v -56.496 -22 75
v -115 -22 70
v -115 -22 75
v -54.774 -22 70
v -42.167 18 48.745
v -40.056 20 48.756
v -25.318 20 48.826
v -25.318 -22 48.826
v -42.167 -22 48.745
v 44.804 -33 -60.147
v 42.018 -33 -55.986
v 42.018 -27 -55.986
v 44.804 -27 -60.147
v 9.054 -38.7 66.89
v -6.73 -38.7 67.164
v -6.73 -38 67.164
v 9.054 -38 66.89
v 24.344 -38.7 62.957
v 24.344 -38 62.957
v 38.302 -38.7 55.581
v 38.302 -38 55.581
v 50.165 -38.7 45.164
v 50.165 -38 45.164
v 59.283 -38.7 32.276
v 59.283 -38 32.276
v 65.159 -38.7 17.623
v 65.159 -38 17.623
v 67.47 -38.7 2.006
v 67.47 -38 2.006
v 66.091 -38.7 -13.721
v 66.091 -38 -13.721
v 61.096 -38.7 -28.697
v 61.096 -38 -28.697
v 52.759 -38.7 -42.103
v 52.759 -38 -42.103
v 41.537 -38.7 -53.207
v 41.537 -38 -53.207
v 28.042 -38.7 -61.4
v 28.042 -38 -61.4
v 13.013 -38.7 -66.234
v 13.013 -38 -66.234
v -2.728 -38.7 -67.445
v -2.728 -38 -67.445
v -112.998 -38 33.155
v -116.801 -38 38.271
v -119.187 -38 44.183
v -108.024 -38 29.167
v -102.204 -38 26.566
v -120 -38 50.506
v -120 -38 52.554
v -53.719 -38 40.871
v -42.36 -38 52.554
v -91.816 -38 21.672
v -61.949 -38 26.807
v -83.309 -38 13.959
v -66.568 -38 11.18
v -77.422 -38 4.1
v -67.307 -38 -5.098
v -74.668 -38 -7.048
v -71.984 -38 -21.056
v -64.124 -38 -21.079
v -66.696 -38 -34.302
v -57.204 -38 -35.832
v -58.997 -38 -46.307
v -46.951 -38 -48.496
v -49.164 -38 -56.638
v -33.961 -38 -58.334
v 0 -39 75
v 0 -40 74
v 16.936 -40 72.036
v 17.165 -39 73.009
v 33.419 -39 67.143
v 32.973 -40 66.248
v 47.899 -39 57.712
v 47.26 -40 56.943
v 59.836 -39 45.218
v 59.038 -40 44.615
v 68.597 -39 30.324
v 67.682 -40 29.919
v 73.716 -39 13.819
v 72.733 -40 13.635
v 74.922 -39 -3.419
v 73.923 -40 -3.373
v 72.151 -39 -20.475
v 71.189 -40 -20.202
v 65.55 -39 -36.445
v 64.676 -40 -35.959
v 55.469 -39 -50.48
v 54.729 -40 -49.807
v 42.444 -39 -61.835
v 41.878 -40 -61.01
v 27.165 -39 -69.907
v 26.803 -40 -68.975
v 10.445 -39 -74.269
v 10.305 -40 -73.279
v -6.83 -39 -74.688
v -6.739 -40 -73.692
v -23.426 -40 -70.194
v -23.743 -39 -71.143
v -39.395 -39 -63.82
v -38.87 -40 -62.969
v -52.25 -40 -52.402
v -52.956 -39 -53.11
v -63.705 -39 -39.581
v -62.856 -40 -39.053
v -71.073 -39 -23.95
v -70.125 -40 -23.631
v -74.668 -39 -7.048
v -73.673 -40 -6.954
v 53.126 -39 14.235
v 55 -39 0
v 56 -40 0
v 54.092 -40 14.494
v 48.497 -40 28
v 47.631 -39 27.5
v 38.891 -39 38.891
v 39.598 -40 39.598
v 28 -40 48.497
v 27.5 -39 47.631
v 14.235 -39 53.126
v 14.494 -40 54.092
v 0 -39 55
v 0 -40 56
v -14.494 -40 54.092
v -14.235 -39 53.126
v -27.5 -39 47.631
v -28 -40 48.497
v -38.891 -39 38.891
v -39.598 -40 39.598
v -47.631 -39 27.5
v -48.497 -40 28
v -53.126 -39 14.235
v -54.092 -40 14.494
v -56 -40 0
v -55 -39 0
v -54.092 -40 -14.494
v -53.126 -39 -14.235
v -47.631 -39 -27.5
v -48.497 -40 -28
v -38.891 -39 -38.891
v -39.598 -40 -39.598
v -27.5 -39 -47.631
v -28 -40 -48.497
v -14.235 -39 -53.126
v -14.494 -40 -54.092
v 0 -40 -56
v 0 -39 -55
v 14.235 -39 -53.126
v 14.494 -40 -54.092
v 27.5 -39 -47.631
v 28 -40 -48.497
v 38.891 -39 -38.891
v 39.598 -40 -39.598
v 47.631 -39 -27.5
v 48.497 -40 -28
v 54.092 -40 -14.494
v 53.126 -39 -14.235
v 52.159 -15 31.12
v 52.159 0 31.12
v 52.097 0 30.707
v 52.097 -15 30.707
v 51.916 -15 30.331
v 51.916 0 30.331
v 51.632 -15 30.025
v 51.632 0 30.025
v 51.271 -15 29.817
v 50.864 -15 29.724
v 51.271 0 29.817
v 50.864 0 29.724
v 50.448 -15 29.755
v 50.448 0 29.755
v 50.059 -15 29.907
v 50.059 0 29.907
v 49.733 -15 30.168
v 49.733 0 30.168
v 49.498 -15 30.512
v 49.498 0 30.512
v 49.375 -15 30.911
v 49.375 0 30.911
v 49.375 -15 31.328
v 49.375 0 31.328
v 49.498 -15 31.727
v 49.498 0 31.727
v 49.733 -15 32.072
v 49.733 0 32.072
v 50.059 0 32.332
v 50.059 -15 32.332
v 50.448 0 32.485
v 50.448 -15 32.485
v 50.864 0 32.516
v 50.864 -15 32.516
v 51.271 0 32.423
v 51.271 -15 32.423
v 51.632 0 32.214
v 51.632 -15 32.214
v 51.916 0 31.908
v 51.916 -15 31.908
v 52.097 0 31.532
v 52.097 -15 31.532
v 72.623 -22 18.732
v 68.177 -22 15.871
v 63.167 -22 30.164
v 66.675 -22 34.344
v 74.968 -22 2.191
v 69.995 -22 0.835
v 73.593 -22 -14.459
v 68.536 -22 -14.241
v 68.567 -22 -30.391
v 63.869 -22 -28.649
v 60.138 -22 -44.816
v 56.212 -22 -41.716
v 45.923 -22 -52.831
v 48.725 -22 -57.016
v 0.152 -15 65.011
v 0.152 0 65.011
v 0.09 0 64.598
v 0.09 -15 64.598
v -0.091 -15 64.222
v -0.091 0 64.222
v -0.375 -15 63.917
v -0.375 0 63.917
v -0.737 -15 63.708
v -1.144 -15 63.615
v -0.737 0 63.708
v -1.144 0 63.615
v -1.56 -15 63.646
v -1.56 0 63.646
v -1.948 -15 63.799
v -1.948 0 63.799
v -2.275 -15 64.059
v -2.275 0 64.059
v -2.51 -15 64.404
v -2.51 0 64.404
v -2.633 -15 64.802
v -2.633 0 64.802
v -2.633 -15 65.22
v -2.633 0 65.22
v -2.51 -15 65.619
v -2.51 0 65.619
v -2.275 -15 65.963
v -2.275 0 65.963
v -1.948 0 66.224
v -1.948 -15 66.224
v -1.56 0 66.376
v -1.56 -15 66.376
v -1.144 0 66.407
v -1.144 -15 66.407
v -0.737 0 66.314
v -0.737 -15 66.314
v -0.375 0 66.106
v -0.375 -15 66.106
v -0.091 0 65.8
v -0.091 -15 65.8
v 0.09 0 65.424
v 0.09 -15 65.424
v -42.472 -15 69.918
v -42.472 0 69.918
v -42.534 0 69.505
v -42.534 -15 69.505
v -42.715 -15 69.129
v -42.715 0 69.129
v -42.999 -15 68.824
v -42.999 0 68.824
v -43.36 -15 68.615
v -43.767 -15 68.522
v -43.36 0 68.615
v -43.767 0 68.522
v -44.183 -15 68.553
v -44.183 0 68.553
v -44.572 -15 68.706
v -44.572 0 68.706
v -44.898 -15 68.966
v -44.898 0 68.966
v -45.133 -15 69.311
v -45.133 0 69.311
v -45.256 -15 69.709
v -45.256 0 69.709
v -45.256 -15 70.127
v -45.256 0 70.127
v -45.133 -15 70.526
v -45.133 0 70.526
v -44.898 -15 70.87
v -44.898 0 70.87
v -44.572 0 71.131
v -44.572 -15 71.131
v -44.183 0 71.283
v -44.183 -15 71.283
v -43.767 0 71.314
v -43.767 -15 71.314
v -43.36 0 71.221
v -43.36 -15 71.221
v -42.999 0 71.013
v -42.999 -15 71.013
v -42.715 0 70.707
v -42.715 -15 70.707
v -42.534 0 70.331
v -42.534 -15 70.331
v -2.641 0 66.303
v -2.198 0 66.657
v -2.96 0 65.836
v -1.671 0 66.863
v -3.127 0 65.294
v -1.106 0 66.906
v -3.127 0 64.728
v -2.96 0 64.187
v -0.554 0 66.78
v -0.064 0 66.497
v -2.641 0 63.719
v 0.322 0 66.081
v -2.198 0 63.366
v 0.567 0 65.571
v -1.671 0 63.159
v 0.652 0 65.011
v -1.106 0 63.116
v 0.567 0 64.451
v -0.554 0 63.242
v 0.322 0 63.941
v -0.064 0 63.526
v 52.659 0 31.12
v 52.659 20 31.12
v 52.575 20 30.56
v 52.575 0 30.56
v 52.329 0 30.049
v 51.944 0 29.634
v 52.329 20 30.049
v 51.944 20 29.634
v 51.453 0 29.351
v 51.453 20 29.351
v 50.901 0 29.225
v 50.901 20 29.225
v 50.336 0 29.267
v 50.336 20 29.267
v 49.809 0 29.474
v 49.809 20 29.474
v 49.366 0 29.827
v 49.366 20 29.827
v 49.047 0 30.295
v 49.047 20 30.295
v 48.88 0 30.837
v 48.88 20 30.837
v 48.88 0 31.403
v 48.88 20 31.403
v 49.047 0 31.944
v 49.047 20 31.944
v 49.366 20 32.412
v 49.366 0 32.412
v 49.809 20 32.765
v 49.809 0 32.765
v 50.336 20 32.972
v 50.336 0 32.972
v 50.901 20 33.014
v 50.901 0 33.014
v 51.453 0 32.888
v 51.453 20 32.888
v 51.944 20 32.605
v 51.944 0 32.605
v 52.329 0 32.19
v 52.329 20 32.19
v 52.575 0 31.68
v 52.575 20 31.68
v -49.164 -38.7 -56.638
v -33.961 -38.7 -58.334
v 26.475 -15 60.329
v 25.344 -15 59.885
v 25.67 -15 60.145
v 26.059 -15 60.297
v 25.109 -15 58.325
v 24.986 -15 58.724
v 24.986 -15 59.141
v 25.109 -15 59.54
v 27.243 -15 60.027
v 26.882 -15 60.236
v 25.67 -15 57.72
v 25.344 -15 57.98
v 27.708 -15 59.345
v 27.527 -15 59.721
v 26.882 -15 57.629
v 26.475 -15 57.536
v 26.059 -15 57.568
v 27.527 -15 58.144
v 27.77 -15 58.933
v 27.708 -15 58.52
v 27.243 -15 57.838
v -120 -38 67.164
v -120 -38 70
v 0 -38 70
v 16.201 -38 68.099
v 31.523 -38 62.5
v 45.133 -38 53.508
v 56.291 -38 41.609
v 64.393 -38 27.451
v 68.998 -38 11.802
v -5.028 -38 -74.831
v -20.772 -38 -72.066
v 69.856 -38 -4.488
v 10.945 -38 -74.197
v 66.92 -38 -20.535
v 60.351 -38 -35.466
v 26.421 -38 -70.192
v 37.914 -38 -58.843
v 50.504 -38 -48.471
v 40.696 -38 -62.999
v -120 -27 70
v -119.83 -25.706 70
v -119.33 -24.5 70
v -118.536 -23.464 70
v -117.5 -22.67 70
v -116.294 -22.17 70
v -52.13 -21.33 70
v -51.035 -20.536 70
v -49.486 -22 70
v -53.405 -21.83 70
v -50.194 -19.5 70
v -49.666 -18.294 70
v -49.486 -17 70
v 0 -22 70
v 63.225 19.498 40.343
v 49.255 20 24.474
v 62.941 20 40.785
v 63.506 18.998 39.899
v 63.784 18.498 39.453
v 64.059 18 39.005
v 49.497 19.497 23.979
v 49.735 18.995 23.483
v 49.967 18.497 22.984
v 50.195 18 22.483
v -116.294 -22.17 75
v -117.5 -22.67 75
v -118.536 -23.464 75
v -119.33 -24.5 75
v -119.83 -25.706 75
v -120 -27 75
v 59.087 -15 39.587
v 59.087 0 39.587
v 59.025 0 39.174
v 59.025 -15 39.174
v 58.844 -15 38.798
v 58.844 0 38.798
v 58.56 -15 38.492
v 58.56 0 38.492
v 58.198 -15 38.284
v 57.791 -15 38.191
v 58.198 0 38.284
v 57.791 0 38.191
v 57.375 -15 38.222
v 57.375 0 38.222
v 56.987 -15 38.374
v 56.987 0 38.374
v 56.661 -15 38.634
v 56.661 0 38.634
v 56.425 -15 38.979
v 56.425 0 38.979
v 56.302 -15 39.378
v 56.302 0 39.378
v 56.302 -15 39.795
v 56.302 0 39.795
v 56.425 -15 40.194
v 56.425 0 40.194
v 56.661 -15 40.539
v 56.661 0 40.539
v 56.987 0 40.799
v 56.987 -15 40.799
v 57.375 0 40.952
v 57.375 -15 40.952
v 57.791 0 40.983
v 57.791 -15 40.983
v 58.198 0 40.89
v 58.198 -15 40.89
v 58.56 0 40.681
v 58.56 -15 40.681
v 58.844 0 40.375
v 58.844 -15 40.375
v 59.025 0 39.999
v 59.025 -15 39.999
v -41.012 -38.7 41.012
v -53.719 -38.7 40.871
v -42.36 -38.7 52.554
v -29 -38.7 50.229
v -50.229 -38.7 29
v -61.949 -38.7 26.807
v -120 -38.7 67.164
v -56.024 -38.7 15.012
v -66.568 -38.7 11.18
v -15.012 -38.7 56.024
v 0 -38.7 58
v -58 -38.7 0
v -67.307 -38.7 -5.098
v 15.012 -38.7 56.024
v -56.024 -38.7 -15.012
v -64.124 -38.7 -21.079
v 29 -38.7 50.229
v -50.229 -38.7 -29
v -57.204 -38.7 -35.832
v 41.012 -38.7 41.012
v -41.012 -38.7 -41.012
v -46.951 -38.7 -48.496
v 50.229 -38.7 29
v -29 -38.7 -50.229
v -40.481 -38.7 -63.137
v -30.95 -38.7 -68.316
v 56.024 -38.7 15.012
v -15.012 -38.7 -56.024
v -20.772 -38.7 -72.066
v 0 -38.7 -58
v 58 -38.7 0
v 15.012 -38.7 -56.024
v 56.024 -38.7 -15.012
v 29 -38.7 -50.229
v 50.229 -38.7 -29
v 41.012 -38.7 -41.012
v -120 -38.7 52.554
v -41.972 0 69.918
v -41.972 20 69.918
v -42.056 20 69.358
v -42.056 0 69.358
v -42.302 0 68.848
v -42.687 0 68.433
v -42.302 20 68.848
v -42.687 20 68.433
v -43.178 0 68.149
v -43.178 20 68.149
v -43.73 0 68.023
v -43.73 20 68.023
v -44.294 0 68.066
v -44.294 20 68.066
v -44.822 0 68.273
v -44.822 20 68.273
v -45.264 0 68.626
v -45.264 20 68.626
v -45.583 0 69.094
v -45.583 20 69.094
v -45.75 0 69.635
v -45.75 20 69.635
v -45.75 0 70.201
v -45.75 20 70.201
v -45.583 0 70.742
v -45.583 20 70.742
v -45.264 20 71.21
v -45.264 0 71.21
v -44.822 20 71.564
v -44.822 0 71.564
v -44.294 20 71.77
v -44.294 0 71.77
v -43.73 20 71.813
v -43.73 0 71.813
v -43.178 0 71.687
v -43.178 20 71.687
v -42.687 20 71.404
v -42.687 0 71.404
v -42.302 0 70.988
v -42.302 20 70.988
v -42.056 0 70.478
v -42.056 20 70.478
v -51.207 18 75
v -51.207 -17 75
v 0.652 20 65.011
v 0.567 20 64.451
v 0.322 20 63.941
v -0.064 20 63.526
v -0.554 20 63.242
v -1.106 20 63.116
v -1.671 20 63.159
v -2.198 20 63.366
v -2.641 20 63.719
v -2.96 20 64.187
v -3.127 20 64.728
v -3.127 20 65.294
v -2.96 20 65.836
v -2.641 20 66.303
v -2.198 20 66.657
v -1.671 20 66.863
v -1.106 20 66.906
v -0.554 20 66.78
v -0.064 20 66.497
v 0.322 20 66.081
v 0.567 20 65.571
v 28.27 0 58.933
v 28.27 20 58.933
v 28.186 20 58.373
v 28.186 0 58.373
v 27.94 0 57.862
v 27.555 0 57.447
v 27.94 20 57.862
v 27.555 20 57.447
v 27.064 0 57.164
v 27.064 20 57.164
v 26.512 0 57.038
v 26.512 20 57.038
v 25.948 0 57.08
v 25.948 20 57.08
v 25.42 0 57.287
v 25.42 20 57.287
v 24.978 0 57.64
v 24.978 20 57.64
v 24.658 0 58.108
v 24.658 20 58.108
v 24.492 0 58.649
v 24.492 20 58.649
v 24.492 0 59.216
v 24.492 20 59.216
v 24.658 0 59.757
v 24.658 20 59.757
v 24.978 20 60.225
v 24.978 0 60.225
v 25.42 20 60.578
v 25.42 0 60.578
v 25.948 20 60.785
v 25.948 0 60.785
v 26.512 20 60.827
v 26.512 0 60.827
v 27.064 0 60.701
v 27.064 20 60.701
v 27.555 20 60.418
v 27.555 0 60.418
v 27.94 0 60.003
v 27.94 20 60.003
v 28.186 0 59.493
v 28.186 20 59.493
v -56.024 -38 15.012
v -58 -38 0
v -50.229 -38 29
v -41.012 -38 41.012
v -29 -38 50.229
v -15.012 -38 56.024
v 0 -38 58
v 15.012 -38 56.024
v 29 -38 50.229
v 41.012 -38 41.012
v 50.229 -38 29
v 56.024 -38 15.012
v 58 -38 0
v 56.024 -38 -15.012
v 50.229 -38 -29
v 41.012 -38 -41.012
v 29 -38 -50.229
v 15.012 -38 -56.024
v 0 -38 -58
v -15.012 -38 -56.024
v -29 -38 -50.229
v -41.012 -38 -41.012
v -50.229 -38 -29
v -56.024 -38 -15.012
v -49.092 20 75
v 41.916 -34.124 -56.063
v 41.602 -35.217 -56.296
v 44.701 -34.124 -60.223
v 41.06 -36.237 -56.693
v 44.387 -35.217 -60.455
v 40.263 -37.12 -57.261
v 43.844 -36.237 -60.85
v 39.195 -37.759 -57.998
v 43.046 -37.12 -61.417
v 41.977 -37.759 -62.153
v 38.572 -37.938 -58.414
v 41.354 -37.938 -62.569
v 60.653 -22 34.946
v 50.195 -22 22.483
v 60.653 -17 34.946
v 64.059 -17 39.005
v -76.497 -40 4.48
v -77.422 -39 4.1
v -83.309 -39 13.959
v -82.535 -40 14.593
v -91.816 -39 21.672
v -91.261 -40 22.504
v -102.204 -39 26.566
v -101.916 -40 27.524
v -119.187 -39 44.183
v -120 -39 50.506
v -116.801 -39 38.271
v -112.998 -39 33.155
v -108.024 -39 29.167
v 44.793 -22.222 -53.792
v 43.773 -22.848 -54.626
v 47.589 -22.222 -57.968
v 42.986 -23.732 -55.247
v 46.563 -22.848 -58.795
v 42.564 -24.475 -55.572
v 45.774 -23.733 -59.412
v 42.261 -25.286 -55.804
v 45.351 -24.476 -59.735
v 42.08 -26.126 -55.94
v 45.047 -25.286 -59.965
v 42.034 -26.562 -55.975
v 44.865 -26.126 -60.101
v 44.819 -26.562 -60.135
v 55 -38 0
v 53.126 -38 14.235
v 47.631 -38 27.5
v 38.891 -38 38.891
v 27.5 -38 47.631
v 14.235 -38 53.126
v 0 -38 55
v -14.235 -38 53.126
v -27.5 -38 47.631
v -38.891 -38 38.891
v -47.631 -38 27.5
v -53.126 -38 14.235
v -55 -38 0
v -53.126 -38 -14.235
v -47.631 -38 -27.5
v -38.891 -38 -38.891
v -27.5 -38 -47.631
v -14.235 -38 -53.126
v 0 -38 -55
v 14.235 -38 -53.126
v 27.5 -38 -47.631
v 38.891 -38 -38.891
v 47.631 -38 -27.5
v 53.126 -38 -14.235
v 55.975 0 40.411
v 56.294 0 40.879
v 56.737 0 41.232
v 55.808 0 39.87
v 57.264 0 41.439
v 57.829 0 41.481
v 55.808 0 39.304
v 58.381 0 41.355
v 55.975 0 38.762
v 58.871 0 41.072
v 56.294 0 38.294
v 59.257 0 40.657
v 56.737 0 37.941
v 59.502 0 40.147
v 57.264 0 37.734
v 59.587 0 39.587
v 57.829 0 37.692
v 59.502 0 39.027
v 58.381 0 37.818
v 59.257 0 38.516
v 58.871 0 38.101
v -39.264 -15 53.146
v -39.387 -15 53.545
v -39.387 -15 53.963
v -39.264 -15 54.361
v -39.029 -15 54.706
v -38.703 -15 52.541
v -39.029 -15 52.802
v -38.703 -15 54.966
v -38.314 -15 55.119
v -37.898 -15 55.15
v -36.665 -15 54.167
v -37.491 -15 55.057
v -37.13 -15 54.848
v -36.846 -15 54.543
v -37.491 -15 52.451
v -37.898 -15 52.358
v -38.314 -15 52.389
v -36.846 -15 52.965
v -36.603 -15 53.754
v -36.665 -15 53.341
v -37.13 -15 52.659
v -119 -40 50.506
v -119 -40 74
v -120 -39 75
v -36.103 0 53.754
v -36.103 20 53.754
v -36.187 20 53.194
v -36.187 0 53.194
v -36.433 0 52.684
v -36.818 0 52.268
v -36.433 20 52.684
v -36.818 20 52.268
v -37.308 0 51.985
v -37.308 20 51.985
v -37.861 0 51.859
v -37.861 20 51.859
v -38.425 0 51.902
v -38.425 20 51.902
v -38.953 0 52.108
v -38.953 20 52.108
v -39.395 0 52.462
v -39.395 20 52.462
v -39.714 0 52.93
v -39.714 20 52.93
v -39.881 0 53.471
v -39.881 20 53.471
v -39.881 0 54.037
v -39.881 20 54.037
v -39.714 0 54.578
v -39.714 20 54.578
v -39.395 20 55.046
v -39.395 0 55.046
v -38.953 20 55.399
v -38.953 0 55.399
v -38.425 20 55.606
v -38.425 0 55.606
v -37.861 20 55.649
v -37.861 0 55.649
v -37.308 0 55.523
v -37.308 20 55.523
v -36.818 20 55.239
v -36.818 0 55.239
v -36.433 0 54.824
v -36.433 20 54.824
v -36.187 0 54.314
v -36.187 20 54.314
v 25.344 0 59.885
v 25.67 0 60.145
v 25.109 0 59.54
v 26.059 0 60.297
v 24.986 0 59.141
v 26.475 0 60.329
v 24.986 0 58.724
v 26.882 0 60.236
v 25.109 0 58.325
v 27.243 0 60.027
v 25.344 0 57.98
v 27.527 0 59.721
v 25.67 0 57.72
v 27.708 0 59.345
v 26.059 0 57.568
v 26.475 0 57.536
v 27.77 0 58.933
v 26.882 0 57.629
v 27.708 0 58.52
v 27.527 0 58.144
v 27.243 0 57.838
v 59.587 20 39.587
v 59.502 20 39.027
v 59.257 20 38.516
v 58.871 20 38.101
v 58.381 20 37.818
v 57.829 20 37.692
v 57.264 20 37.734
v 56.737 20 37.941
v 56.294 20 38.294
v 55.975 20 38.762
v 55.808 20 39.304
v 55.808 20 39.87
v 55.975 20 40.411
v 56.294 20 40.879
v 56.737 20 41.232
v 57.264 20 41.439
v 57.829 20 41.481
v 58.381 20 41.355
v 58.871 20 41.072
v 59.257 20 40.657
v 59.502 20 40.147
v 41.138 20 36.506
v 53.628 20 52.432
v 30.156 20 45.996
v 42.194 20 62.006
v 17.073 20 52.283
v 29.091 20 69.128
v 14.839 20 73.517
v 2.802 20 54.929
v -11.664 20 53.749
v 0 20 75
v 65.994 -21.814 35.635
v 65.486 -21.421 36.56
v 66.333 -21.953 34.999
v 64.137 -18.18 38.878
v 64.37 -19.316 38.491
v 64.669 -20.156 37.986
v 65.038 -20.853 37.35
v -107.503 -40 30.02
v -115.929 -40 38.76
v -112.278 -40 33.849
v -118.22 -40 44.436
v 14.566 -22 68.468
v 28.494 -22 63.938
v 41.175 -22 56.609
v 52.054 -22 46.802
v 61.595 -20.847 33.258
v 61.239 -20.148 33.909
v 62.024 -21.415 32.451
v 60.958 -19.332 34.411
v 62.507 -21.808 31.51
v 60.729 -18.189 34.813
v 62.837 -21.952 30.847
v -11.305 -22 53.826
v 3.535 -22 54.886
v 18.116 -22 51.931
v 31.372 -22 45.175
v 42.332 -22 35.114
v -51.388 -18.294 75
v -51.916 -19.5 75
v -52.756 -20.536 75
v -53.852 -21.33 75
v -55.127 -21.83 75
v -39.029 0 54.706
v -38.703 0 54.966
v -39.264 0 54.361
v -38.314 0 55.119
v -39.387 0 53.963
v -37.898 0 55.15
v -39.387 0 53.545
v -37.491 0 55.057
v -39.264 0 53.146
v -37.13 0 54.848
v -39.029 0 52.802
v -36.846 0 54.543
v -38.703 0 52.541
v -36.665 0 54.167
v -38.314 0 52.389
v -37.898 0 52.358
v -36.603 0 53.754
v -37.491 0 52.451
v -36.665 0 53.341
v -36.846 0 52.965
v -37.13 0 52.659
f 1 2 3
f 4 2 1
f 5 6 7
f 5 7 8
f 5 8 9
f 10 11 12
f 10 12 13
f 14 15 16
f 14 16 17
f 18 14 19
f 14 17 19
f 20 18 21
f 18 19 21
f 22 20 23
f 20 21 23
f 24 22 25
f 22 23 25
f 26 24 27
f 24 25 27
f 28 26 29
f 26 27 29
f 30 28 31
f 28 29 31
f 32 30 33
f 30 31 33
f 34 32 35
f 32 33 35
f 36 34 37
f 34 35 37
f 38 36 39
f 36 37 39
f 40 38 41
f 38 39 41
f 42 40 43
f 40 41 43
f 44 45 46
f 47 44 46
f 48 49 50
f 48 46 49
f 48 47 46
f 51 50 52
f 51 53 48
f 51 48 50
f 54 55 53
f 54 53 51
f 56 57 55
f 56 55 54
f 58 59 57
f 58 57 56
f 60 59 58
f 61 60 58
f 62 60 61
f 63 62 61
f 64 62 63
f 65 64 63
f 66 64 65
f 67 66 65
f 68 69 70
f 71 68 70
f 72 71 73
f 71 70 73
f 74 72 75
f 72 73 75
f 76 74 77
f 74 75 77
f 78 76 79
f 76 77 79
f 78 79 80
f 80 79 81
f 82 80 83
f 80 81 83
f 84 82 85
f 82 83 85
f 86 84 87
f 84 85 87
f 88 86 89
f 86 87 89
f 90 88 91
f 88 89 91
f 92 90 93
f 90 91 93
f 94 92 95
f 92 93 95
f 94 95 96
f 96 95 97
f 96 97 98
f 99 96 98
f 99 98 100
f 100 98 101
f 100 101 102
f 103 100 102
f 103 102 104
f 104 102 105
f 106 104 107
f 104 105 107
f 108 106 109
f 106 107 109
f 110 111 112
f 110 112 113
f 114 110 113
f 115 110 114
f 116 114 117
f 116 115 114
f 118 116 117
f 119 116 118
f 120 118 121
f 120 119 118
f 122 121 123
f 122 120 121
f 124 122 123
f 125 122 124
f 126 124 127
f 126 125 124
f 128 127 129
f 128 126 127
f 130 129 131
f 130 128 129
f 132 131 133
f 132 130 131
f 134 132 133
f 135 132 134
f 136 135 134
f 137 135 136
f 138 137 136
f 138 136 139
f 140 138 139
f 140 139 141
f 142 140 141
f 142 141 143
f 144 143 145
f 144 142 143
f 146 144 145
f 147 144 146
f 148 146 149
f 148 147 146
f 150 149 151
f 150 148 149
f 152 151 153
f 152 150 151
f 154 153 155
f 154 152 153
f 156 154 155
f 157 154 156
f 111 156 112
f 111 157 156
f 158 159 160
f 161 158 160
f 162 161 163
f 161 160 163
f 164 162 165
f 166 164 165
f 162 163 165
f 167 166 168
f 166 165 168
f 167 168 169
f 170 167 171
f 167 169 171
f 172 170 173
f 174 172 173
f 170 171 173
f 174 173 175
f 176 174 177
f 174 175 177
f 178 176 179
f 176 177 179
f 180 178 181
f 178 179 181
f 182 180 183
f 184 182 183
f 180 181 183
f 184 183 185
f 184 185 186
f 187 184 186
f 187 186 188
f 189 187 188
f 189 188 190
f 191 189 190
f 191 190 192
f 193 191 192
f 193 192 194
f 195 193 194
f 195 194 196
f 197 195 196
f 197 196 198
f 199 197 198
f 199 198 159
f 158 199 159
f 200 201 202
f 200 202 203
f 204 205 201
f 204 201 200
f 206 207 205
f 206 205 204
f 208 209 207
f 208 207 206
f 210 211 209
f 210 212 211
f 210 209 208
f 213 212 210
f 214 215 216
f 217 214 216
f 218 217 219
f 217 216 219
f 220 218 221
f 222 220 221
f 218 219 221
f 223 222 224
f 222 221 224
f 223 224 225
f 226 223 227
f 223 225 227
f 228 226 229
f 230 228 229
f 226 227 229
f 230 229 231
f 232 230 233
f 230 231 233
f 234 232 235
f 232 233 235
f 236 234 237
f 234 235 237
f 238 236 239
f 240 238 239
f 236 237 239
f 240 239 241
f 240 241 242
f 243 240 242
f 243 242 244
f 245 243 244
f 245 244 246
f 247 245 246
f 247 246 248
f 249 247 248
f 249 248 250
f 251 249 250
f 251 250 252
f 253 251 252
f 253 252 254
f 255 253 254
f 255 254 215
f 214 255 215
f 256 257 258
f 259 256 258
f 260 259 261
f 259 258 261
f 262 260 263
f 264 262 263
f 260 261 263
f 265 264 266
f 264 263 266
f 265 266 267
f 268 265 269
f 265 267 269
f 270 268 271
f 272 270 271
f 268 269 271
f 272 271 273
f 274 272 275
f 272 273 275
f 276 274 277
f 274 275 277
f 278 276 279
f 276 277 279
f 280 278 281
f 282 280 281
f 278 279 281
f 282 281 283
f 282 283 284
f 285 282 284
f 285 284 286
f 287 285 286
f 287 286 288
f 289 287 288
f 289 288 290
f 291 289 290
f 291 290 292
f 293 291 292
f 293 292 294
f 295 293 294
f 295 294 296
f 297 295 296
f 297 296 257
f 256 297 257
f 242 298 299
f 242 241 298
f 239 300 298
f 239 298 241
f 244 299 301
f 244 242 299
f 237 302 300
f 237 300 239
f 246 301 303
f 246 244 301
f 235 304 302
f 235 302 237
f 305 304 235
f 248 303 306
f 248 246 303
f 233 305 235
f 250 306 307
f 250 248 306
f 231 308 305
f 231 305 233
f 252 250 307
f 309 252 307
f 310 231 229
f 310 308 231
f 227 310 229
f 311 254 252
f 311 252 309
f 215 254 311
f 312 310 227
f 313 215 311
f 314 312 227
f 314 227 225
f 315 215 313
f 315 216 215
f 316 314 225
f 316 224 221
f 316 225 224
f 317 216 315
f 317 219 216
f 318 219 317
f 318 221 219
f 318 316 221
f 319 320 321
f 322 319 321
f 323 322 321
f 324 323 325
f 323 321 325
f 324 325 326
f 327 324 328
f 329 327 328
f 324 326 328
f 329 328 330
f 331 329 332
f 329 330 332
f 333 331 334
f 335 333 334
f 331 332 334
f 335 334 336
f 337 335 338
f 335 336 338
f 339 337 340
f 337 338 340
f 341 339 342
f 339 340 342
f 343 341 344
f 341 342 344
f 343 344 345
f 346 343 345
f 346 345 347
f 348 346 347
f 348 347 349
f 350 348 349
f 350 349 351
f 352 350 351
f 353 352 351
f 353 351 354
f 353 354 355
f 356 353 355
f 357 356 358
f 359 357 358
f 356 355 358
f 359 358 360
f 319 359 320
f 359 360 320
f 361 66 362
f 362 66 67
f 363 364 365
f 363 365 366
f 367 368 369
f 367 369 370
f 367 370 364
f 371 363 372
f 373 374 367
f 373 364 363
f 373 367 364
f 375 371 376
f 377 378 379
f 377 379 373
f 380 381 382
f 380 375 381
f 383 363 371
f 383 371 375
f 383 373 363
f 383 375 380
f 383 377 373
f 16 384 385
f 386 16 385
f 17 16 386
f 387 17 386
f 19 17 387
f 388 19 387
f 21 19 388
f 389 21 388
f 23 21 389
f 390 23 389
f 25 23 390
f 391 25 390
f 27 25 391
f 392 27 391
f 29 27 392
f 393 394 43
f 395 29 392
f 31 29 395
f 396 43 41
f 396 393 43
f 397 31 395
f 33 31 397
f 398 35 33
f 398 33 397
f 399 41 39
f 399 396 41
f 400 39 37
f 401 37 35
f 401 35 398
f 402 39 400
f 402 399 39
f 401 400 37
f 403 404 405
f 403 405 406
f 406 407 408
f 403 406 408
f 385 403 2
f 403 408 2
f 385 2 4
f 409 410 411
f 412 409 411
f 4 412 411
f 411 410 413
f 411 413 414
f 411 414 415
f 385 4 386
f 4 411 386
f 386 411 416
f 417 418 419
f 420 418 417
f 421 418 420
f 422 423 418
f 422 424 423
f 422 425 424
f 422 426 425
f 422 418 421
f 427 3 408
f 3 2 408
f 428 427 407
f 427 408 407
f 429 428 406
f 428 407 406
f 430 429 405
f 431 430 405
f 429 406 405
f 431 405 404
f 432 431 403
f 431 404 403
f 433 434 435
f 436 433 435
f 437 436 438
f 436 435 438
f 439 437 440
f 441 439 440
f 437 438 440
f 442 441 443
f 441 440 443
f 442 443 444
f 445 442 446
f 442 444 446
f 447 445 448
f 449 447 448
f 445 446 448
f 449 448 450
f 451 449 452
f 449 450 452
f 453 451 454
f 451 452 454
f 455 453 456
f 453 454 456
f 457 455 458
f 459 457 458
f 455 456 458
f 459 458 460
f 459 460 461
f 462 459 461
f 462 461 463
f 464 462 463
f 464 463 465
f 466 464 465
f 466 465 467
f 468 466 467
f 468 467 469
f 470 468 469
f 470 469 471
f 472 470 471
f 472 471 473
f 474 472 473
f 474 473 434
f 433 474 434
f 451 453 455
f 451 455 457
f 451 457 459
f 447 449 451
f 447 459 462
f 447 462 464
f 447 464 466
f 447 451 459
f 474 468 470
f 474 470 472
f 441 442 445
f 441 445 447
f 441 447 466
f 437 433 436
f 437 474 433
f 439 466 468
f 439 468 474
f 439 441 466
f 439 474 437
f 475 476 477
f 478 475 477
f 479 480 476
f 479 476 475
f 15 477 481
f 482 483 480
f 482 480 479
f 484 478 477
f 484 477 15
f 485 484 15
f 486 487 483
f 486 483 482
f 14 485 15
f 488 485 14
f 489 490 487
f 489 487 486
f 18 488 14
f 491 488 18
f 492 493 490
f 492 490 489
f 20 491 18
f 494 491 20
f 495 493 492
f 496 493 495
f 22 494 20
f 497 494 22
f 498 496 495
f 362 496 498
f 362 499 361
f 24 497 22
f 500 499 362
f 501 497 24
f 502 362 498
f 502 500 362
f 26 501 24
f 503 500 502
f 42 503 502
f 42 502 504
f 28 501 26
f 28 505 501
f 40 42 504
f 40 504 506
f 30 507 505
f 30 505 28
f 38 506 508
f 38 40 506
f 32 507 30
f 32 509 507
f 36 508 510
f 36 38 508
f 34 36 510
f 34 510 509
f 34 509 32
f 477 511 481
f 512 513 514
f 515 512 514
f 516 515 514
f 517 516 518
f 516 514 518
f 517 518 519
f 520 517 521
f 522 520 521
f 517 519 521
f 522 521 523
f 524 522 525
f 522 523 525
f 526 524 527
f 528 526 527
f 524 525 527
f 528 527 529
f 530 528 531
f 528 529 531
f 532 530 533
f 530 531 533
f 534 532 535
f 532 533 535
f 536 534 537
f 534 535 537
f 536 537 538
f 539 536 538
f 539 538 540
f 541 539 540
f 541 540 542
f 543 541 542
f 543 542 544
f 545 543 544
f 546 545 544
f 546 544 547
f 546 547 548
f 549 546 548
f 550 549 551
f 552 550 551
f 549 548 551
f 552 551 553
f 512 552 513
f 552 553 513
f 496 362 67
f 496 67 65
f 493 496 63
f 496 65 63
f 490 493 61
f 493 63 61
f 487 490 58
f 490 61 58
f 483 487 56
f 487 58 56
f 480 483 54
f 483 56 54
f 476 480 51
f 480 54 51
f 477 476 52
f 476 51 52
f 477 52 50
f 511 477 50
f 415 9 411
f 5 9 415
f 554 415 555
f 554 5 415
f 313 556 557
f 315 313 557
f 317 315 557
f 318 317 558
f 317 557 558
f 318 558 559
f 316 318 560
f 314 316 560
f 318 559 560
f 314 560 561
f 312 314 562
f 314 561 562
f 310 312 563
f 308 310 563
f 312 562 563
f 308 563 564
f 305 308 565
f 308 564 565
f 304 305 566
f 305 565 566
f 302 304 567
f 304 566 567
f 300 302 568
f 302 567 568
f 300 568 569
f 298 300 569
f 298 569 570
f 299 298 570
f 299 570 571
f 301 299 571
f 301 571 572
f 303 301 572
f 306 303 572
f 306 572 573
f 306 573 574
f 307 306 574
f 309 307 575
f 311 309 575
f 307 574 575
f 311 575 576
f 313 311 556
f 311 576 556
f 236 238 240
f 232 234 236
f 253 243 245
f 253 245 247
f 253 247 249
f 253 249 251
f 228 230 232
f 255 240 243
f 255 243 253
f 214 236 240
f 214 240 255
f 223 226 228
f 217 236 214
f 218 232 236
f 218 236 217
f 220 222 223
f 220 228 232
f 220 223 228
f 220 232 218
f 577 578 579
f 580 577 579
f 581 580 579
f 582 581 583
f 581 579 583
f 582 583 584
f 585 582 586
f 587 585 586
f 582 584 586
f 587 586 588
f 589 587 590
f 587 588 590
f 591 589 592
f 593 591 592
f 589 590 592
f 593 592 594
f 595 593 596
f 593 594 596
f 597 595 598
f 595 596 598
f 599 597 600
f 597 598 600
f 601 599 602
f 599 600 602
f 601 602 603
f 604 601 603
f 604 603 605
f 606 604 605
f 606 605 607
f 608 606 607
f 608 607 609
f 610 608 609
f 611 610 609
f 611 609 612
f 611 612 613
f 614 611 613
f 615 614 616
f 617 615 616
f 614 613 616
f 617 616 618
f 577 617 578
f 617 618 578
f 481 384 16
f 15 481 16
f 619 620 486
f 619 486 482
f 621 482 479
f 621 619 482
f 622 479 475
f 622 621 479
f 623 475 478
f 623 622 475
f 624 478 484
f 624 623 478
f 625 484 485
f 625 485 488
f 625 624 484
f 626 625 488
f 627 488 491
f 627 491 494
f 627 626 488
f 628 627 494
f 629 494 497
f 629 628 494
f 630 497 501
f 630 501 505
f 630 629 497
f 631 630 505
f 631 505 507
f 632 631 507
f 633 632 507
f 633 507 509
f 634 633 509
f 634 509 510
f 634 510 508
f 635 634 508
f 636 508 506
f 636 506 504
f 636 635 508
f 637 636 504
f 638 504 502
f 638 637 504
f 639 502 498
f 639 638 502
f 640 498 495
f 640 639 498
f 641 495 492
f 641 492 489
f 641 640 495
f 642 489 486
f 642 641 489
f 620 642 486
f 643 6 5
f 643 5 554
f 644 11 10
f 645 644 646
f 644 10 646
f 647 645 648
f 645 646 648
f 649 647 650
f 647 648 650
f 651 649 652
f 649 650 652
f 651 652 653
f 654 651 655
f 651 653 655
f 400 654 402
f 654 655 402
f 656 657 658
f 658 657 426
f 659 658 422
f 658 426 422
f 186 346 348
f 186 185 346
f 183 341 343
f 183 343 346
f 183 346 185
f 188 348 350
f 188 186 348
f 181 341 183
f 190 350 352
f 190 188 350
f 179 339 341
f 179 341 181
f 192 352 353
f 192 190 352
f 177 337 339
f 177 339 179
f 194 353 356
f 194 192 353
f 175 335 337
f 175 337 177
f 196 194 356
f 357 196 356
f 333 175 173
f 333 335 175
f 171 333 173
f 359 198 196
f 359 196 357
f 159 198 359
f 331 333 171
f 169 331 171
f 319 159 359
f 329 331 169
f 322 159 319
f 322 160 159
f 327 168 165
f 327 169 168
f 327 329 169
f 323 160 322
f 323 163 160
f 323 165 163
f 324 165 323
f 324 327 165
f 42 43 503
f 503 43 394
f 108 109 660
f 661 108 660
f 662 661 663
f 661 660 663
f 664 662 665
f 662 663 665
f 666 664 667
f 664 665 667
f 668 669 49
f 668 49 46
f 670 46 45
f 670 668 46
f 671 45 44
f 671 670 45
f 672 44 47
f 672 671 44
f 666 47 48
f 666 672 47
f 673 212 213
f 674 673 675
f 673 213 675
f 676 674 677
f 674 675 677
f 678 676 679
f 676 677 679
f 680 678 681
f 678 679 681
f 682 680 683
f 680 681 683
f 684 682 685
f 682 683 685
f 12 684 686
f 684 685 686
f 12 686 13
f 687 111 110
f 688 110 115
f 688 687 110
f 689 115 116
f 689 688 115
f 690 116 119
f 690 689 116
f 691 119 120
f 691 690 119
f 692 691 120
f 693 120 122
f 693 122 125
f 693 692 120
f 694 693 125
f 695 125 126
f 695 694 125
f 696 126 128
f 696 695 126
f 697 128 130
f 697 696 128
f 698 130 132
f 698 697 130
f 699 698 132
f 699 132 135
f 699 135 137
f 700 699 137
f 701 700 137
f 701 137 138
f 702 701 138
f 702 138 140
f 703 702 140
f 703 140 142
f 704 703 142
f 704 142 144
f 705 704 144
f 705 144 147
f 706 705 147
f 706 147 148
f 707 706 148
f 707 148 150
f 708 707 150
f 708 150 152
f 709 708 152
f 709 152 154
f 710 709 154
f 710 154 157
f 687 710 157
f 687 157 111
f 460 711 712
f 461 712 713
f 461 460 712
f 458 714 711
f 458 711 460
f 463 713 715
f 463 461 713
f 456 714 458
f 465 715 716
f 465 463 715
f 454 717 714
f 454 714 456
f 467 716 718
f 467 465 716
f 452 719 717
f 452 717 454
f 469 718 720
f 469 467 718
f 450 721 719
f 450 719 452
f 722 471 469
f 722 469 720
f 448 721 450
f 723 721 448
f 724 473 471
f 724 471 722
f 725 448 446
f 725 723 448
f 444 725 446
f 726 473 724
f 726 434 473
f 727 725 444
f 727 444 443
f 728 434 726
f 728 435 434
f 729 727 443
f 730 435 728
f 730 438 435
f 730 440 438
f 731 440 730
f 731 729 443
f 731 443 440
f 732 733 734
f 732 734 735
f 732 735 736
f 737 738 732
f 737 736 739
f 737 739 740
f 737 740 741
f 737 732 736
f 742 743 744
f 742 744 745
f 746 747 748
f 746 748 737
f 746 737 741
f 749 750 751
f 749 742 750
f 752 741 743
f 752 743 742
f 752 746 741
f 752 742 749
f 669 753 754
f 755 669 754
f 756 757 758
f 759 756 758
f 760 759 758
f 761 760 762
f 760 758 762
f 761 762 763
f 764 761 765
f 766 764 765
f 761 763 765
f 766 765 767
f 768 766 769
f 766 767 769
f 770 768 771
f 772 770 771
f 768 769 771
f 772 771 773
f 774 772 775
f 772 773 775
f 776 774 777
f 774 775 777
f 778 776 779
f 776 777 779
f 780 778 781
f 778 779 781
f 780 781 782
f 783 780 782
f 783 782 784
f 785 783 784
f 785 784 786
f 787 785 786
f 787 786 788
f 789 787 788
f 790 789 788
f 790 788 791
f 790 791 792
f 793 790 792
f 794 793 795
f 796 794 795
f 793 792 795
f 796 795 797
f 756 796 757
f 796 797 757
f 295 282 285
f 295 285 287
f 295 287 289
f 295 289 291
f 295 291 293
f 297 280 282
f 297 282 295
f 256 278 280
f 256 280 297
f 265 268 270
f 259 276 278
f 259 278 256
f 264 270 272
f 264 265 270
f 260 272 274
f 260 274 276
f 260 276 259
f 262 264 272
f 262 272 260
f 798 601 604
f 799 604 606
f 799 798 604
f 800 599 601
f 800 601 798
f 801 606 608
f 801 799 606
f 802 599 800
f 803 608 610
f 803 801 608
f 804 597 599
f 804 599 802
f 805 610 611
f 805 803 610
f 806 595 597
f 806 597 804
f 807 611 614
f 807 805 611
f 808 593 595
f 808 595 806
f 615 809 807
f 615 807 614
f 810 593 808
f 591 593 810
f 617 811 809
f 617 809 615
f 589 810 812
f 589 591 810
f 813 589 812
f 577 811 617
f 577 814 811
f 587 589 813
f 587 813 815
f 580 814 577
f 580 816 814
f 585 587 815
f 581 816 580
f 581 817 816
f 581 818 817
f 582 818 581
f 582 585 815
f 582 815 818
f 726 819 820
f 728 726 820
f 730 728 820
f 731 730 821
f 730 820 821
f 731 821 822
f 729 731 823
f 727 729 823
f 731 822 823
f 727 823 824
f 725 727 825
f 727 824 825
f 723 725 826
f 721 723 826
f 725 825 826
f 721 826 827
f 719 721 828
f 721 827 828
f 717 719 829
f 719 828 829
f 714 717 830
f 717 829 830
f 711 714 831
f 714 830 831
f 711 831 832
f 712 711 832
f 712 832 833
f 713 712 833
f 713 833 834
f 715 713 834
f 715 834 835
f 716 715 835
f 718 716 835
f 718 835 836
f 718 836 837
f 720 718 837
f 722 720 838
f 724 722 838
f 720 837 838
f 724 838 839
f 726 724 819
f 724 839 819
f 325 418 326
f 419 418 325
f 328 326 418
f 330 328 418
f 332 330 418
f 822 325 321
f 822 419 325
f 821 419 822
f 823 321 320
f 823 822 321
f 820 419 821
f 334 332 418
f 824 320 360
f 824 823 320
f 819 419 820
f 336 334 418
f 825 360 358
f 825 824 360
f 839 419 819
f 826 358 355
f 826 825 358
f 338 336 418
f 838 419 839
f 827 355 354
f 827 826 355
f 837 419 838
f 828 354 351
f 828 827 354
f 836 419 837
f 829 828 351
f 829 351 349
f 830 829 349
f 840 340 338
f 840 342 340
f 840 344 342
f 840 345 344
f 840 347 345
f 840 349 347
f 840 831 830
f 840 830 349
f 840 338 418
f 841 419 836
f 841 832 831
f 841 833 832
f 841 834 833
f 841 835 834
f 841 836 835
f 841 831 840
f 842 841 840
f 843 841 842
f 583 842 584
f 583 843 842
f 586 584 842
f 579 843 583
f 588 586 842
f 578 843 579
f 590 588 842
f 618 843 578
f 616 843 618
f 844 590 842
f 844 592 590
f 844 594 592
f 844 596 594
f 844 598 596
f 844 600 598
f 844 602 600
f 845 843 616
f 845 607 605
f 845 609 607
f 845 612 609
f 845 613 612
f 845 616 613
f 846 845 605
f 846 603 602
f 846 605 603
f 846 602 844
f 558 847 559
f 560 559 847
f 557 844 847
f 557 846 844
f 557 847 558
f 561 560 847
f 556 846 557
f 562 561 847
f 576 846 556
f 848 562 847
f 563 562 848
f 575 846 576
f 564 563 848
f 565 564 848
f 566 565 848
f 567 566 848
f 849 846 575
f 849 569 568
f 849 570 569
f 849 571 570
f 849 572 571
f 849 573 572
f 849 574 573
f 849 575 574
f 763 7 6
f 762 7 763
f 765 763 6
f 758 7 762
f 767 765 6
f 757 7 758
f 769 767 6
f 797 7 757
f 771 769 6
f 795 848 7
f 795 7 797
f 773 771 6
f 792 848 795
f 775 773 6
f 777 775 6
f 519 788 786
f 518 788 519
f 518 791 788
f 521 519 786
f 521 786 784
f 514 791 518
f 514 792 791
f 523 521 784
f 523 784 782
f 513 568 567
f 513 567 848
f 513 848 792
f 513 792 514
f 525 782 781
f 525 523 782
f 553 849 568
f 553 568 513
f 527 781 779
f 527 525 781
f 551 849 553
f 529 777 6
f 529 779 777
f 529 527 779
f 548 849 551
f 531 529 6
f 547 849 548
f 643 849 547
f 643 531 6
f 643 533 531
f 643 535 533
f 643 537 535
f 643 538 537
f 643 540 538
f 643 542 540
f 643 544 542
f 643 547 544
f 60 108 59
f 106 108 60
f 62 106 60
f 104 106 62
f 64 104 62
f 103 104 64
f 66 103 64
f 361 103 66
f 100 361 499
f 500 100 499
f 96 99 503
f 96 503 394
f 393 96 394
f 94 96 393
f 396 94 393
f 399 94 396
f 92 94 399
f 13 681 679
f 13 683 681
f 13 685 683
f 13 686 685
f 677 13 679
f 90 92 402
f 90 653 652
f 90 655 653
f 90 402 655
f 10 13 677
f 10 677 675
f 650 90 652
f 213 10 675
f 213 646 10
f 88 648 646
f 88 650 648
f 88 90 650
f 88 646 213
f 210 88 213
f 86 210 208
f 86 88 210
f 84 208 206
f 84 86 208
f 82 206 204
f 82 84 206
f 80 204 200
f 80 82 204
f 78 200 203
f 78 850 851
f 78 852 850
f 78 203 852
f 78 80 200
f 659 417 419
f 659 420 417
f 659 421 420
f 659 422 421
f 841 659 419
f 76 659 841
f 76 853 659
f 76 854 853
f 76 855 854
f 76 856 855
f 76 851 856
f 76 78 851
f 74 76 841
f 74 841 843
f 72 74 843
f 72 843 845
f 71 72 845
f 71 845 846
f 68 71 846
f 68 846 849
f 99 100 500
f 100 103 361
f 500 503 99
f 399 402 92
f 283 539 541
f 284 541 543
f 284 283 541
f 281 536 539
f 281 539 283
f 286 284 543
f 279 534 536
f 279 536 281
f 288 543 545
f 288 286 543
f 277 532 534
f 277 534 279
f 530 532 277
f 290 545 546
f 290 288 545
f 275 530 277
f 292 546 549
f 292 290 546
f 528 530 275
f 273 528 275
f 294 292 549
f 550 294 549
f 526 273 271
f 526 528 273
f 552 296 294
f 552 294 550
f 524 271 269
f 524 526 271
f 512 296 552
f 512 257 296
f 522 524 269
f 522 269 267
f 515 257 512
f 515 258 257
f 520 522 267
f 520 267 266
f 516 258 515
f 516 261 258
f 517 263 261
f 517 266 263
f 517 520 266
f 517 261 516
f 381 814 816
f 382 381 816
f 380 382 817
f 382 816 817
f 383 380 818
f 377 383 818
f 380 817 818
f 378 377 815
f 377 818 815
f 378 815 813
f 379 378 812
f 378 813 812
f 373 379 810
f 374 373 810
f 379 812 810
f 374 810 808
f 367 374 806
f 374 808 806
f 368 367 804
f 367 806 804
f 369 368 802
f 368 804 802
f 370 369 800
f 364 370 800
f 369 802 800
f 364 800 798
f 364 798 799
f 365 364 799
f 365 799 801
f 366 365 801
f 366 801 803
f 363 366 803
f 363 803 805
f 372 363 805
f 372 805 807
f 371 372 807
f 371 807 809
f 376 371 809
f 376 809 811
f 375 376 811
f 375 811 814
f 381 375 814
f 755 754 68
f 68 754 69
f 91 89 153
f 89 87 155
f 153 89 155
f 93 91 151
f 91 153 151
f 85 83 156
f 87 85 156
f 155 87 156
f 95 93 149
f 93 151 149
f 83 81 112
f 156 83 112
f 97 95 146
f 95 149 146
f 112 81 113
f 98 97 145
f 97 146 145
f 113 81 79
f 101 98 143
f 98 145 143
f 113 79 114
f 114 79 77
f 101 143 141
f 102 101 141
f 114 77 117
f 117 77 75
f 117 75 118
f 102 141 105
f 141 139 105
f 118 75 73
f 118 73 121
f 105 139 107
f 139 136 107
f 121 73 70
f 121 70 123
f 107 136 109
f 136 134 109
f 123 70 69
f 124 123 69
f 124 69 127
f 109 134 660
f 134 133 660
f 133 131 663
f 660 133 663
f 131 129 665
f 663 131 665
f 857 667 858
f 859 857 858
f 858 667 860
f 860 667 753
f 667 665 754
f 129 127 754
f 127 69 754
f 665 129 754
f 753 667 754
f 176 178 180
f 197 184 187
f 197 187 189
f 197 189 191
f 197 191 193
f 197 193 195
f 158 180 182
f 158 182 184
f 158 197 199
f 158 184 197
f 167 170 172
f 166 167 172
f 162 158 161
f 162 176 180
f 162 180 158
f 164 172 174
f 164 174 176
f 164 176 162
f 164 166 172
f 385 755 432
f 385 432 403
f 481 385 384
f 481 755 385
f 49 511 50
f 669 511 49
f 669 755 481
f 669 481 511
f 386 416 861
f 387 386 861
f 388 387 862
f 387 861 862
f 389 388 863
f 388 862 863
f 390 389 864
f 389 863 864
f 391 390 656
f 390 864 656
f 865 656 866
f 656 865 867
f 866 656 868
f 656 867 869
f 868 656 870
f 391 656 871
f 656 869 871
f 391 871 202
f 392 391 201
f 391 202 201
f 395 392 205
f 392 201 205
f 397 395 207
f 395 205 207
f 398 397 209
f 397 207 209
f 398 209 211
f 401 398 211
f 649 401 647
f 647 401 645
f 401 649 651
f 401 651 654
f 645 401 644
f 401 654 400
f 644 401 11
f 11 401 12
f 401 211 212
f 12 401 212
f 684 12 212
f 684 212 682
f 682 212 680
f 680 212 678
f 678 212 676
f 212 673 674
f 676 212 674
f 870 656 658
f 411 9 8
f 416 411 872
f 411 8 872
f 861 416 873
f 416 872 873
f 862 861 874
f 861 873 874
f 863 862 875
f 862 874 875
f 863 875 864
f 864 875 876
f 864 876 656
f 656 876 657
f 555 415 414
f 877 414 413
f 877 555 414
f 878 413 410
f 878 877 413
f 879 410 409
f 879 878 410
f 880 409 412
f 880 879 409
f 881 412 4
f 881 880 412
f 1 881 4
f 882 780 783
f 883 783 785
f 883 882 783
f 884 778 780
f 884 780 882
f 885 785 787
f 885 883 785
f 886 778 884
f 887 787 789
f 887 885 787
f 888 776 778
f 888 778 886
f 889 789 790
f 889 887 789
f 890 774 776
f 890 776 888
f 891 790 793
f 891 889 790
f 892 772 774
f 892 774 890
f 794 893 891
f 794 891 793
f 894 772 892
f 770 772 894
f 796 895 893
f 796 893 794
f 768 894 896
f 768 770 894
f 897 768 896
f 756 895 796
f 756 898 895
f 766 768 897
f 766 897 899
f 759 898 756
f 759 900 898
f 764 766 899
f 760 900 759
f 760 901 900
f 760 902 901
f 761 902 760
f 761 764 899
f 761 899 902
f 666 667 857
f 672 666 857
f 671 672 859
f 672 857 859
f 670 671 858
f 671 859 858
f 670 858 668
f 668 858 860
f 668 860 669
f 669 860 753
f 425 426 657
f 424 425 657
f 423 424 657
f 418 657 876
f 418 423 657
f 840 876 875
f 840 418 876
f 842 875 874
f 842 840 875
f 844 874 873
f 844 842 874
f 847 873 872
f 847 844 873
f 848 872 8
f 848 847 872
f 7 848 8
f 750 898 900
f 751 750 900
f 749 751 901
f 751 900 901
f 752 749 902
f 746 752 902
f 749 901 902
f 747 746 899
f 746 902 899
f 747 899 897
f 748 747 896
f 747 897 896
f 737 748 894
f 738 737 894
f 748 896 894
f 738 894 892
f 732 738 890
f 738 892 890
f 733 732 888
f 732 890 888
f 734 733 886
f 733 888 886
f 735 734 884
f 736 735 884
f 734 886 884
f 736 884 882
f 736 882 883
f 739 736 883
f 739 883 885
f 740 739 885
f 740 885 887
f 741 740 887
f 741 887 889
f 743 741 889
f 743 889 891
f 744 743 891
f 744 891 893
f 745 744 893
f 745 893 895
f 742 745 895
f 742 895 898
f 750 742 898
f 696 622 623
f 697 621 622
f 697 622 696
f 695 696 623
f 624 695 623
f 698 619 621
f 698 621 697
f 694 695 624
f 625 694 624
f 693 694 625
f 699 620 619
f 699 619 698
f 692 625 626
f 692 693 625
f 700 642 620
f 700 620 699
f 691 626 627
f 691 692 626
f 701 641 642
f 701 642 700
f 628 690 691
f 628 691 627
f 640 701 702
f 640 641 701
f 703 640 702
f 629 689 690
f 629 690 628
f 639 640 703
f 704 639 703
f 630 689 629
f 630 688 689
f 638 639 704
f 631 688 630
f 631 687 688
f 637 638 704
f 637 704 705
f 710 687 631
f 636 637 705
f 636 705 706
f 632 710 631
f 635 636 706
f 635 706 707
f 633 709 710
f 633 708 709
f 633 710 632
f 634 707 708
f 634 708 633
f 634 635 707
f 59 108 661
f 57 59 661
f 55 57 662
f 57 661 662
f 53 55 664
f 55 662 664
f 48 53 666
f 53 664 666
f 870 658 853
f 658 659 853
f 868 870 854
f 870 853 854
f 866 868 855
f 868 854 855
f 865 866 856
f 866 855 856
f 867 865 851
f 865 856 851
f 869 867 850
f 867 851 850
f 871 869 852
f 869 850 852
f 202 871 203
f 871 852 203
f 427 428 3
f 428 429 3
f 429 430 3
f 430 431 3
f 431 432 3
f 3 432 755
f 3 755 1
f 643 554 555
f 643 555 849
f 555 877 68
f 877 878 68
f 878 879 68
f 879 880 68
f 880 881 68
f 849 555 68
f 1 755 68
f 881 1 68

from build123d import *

# Parameters (mm, degrees)
SKETCH_R        = 55
PAD_DEPTH       = 40
PAD_DEPTH_BACK  = 20
POCKET_DEPTH    = 42
POCKET001_DEPTH = 16
SKETCH004_R     = 67.5
SKETCH004_R_2   = 58
POCKET002_DEPTH = 0.7
POCKET003_DEPTH = 0.7
SKETCH006_R     = 1.4
POCKET004_DEPTH = 35
SKETCH007_R     = 1.9
POCKET005_DEPTH = 20
FILLET_R        = 5
FILLET001_R     = 5
FILLET002_R     = 5
FILLET003_R     = 5
CHAMFER_SIZE    = 2
CHAMFER001_SIZE = 1


with BuildPart() as part:
    # Sketch → Pad (new body, two sides)
    with BuildSketch(Plane.XZ) as pad_sk:
        with BuildLine():
            Line((-120, 75), (0, 75))
            ThreePointArc((-74.66808, -7.048245), (55.468993, -50.479608), (0, 75))
            ThreePointArc((-74.66808, -7.048245), (-83.30852, 13.959176), (-102.203647, 26.566441))
            ThreePointArc((-120, 50.506104), (-115.063539, 35.591198), (-102.203647, 26.566441))
            Line((-120, 75), (-120, 50.506104))
        make_face()
        Circle(SKETCH_R, mode=Mode.SUBTRACT)
    extrude(amount=PAD_DEPTH)
    extrude(pad_sk.sketch, amount=-PAD_DEPTH_BACK)

    # Sketch001 (on Face7 of Pad) → Pocket (cut)
    with BuildSketch(Plane(origin=(0, 20, 0), x_dir=(1, 0, 0), z_dir=(0, 1, 0))):
        with BuildLine():
            Line((46.551104, -18.140074), (74.636799, -51.611301))
            ThreePointArc((74.636799, -51.611301), (27.033088, 86.623267), (-90.743475, 0))
            Line((-211.758942, -108.831918), (-90.743475, 0))
            Line((-62.856731, -108.831918), (-211.758942, -108.831918))
            Line((-42.167317, -48.745498), (-62.856731, -108.831918))
            Line((9.780971, -48.993879), (-42.167317, -48.745498))
            Line((46.551104, -18.140074), (9.780971, -48.993879))
        make_face()
    extrude(amount=-POCKET_DEPTH, mode=Mode.SUBTRACT)

    # Sketch003 (on Face2 of Pocket) → Pocket001 (cut)
    with BuildSketch(Plane(origin=(0, -22, 0), x_dir=(1, 0, 0), z_dir=(0, 1, 0))):
        with BuildLine():
            ThreePointArc((0, -70), (66.404243, -22.146705), (42.018147, 55.986385))
            Line((42.018147, 55.986385), (62.226624, 86.16832))
            Line((62.226624, 86.16832), (-170.809082, 86.16832))
            Line((-170.809082, 86.16832), (-170.809082, -70))
            Line((-170.809082, -70), (0, -70))
        make_face()
    extrude(amount=-POCKET001_DEPTH, mode=Mode.SUBTRACT)

    # Sketch004 → Pocket002 (cut)
    with BuildSketch(Plane(origin=(0, -38, 0), x_dir=(-1, 0, 0), z_dir=(0, 1, 0))):
        Circle(SKETCH004_R)
        Circle(SKETCH004_R_2, mode=Mode.SUBTRACT)
    extrude(amount=-POCKET002_DEPTH, mode=Mode.SUBTRACT)

    # Sketch005 (on Face14 of Pocket002) → Pocket003 (cut)
    with BuildSketch(Plane(origin=(0, -38, 0), x_dir=(1, 0, 0), z_dir=(0, 1, 0))):
        Polygon((-1.938341, -67.163612), (-28.325365, -52.55386), (-167.517487, -52.55386), (-166.878586, -67.163612), align=None)
        Polygon((12.572289, 63.526501), (-92.206108, 90.359993), (-139.164734, 46.595844), align=None)
    extrude(amount=-POCKET003_DEPTH, mode=Mode.SUBTRACT)

    # Sketch006 (on Face4 of Pocket003) → Pocket004 (cut)
    with BuildSketch(Plane(origin=(0, 20, 0), x_dir=(1, 0, 0), z_dir=(0, 1, 0))):
        with Locations((-38.002514, -53.753925)):
            Circle(SKETCH006_R)
        with Locations((-43.871658, -69.918114)):
            Circle(SKETCH006_R)
        with Locations((-1.248232, -65.011124)):
            Circle(SKETCH006_R)
        with Locations((26.37031, -58.932541)):
            Circle(SKETCH006_R)
        with Locations((50.759274, -31.119787)):
            Circle(SKETCH006_R)
        with Locations((57.686783, -39.586739)):
            Circle(SKETCH006_R)
    extrude(amount=-POCKET004_DEPTH, mode=Mode.SUBTRACT)

    # Sketch007 (on Face4 of Pocket004) → Pocket005 (cut)
    with BuildSketch(Plane(origin=(0, 20, 0), x_dir=(1, 0, 0), z_dir=(0, 1, 0))):
        with Locations((-38.002514, -53.753925)):
            Circle(SKETCH007_R)
        with Locations((-43.871658, -69.918114)):
            Circle(SKETCH007_R)
        with Locations((-1.248232, -65.011124)):
            Circle(SKETCH007_R)
        with Locations((26.37031, -58.932541)):
            Circle(SKETCH007_R)
        with Locations((50.759274, -31.119787)):
            Circle(SKETCH007_R)
        with Locations((57.686783, -39.586739)):
            Circle(SKETCH007_R)
    extrude(amount=-POCKET005_DEPTH, mode=Mode.SUBTRACT)

    # Fillet
    fillet_edges = [part.edges().sort_by_distance(p)[0] for p in [
        (-50.346648, -22, 72.5),
    ]]
    fillet(fillet_edges, radius=FILLET_R)

    # Fillet001
    fillet001_edges = [part.edges().sort_by_distance(p)[0] for p in [
        (-120, -22, 72.5),
    ]]
    fillet(fillet001_edges, radius=FILLET001_R)

    # Fillet002
    fillet002_edges = [part.edges().sort_by_distance(p)[0] for p in [
        (62.35606, -22, 36.975687),
    ]]
    fillet(fillet002_edges, radius=FILLET002_R)

    # Fillet003
    fillet003_edges = [part.edges().sort_by_distance(p)[0] for p in [
        (43.410932, -22, -58.066548),
        (43.410932, -38, -58.066548),
    ]]
    fillet(fillet003_edges, radius=FILLET003_R)

    # Chamfer
    chamfer_edges = [part.edges().sort_by_distance(p)[0] for p in [
        (-46.687392, 20, 61.872749),
        (57.127061, 20, 30.744008),
    ]]
    chamfer(chamfer_edges, length=CHAMFER_SIZE)

    # Chamfer001
    chamfer001_edges = [part.edges().sort_by_distance(p)[0] for p in [
        (-60, -40, 75),
        (55.468993, -40, -50.479608),
        (-83.30852, -40, 13.959176),
        (-115.063539, -40, 35.591198),
        (-120, -40, 62.753052),
        (-55, -40, 0),
    ]]
    chamfer(chamfer001_edges, length=CHAMFER001_SIZE)


solid = part.part
